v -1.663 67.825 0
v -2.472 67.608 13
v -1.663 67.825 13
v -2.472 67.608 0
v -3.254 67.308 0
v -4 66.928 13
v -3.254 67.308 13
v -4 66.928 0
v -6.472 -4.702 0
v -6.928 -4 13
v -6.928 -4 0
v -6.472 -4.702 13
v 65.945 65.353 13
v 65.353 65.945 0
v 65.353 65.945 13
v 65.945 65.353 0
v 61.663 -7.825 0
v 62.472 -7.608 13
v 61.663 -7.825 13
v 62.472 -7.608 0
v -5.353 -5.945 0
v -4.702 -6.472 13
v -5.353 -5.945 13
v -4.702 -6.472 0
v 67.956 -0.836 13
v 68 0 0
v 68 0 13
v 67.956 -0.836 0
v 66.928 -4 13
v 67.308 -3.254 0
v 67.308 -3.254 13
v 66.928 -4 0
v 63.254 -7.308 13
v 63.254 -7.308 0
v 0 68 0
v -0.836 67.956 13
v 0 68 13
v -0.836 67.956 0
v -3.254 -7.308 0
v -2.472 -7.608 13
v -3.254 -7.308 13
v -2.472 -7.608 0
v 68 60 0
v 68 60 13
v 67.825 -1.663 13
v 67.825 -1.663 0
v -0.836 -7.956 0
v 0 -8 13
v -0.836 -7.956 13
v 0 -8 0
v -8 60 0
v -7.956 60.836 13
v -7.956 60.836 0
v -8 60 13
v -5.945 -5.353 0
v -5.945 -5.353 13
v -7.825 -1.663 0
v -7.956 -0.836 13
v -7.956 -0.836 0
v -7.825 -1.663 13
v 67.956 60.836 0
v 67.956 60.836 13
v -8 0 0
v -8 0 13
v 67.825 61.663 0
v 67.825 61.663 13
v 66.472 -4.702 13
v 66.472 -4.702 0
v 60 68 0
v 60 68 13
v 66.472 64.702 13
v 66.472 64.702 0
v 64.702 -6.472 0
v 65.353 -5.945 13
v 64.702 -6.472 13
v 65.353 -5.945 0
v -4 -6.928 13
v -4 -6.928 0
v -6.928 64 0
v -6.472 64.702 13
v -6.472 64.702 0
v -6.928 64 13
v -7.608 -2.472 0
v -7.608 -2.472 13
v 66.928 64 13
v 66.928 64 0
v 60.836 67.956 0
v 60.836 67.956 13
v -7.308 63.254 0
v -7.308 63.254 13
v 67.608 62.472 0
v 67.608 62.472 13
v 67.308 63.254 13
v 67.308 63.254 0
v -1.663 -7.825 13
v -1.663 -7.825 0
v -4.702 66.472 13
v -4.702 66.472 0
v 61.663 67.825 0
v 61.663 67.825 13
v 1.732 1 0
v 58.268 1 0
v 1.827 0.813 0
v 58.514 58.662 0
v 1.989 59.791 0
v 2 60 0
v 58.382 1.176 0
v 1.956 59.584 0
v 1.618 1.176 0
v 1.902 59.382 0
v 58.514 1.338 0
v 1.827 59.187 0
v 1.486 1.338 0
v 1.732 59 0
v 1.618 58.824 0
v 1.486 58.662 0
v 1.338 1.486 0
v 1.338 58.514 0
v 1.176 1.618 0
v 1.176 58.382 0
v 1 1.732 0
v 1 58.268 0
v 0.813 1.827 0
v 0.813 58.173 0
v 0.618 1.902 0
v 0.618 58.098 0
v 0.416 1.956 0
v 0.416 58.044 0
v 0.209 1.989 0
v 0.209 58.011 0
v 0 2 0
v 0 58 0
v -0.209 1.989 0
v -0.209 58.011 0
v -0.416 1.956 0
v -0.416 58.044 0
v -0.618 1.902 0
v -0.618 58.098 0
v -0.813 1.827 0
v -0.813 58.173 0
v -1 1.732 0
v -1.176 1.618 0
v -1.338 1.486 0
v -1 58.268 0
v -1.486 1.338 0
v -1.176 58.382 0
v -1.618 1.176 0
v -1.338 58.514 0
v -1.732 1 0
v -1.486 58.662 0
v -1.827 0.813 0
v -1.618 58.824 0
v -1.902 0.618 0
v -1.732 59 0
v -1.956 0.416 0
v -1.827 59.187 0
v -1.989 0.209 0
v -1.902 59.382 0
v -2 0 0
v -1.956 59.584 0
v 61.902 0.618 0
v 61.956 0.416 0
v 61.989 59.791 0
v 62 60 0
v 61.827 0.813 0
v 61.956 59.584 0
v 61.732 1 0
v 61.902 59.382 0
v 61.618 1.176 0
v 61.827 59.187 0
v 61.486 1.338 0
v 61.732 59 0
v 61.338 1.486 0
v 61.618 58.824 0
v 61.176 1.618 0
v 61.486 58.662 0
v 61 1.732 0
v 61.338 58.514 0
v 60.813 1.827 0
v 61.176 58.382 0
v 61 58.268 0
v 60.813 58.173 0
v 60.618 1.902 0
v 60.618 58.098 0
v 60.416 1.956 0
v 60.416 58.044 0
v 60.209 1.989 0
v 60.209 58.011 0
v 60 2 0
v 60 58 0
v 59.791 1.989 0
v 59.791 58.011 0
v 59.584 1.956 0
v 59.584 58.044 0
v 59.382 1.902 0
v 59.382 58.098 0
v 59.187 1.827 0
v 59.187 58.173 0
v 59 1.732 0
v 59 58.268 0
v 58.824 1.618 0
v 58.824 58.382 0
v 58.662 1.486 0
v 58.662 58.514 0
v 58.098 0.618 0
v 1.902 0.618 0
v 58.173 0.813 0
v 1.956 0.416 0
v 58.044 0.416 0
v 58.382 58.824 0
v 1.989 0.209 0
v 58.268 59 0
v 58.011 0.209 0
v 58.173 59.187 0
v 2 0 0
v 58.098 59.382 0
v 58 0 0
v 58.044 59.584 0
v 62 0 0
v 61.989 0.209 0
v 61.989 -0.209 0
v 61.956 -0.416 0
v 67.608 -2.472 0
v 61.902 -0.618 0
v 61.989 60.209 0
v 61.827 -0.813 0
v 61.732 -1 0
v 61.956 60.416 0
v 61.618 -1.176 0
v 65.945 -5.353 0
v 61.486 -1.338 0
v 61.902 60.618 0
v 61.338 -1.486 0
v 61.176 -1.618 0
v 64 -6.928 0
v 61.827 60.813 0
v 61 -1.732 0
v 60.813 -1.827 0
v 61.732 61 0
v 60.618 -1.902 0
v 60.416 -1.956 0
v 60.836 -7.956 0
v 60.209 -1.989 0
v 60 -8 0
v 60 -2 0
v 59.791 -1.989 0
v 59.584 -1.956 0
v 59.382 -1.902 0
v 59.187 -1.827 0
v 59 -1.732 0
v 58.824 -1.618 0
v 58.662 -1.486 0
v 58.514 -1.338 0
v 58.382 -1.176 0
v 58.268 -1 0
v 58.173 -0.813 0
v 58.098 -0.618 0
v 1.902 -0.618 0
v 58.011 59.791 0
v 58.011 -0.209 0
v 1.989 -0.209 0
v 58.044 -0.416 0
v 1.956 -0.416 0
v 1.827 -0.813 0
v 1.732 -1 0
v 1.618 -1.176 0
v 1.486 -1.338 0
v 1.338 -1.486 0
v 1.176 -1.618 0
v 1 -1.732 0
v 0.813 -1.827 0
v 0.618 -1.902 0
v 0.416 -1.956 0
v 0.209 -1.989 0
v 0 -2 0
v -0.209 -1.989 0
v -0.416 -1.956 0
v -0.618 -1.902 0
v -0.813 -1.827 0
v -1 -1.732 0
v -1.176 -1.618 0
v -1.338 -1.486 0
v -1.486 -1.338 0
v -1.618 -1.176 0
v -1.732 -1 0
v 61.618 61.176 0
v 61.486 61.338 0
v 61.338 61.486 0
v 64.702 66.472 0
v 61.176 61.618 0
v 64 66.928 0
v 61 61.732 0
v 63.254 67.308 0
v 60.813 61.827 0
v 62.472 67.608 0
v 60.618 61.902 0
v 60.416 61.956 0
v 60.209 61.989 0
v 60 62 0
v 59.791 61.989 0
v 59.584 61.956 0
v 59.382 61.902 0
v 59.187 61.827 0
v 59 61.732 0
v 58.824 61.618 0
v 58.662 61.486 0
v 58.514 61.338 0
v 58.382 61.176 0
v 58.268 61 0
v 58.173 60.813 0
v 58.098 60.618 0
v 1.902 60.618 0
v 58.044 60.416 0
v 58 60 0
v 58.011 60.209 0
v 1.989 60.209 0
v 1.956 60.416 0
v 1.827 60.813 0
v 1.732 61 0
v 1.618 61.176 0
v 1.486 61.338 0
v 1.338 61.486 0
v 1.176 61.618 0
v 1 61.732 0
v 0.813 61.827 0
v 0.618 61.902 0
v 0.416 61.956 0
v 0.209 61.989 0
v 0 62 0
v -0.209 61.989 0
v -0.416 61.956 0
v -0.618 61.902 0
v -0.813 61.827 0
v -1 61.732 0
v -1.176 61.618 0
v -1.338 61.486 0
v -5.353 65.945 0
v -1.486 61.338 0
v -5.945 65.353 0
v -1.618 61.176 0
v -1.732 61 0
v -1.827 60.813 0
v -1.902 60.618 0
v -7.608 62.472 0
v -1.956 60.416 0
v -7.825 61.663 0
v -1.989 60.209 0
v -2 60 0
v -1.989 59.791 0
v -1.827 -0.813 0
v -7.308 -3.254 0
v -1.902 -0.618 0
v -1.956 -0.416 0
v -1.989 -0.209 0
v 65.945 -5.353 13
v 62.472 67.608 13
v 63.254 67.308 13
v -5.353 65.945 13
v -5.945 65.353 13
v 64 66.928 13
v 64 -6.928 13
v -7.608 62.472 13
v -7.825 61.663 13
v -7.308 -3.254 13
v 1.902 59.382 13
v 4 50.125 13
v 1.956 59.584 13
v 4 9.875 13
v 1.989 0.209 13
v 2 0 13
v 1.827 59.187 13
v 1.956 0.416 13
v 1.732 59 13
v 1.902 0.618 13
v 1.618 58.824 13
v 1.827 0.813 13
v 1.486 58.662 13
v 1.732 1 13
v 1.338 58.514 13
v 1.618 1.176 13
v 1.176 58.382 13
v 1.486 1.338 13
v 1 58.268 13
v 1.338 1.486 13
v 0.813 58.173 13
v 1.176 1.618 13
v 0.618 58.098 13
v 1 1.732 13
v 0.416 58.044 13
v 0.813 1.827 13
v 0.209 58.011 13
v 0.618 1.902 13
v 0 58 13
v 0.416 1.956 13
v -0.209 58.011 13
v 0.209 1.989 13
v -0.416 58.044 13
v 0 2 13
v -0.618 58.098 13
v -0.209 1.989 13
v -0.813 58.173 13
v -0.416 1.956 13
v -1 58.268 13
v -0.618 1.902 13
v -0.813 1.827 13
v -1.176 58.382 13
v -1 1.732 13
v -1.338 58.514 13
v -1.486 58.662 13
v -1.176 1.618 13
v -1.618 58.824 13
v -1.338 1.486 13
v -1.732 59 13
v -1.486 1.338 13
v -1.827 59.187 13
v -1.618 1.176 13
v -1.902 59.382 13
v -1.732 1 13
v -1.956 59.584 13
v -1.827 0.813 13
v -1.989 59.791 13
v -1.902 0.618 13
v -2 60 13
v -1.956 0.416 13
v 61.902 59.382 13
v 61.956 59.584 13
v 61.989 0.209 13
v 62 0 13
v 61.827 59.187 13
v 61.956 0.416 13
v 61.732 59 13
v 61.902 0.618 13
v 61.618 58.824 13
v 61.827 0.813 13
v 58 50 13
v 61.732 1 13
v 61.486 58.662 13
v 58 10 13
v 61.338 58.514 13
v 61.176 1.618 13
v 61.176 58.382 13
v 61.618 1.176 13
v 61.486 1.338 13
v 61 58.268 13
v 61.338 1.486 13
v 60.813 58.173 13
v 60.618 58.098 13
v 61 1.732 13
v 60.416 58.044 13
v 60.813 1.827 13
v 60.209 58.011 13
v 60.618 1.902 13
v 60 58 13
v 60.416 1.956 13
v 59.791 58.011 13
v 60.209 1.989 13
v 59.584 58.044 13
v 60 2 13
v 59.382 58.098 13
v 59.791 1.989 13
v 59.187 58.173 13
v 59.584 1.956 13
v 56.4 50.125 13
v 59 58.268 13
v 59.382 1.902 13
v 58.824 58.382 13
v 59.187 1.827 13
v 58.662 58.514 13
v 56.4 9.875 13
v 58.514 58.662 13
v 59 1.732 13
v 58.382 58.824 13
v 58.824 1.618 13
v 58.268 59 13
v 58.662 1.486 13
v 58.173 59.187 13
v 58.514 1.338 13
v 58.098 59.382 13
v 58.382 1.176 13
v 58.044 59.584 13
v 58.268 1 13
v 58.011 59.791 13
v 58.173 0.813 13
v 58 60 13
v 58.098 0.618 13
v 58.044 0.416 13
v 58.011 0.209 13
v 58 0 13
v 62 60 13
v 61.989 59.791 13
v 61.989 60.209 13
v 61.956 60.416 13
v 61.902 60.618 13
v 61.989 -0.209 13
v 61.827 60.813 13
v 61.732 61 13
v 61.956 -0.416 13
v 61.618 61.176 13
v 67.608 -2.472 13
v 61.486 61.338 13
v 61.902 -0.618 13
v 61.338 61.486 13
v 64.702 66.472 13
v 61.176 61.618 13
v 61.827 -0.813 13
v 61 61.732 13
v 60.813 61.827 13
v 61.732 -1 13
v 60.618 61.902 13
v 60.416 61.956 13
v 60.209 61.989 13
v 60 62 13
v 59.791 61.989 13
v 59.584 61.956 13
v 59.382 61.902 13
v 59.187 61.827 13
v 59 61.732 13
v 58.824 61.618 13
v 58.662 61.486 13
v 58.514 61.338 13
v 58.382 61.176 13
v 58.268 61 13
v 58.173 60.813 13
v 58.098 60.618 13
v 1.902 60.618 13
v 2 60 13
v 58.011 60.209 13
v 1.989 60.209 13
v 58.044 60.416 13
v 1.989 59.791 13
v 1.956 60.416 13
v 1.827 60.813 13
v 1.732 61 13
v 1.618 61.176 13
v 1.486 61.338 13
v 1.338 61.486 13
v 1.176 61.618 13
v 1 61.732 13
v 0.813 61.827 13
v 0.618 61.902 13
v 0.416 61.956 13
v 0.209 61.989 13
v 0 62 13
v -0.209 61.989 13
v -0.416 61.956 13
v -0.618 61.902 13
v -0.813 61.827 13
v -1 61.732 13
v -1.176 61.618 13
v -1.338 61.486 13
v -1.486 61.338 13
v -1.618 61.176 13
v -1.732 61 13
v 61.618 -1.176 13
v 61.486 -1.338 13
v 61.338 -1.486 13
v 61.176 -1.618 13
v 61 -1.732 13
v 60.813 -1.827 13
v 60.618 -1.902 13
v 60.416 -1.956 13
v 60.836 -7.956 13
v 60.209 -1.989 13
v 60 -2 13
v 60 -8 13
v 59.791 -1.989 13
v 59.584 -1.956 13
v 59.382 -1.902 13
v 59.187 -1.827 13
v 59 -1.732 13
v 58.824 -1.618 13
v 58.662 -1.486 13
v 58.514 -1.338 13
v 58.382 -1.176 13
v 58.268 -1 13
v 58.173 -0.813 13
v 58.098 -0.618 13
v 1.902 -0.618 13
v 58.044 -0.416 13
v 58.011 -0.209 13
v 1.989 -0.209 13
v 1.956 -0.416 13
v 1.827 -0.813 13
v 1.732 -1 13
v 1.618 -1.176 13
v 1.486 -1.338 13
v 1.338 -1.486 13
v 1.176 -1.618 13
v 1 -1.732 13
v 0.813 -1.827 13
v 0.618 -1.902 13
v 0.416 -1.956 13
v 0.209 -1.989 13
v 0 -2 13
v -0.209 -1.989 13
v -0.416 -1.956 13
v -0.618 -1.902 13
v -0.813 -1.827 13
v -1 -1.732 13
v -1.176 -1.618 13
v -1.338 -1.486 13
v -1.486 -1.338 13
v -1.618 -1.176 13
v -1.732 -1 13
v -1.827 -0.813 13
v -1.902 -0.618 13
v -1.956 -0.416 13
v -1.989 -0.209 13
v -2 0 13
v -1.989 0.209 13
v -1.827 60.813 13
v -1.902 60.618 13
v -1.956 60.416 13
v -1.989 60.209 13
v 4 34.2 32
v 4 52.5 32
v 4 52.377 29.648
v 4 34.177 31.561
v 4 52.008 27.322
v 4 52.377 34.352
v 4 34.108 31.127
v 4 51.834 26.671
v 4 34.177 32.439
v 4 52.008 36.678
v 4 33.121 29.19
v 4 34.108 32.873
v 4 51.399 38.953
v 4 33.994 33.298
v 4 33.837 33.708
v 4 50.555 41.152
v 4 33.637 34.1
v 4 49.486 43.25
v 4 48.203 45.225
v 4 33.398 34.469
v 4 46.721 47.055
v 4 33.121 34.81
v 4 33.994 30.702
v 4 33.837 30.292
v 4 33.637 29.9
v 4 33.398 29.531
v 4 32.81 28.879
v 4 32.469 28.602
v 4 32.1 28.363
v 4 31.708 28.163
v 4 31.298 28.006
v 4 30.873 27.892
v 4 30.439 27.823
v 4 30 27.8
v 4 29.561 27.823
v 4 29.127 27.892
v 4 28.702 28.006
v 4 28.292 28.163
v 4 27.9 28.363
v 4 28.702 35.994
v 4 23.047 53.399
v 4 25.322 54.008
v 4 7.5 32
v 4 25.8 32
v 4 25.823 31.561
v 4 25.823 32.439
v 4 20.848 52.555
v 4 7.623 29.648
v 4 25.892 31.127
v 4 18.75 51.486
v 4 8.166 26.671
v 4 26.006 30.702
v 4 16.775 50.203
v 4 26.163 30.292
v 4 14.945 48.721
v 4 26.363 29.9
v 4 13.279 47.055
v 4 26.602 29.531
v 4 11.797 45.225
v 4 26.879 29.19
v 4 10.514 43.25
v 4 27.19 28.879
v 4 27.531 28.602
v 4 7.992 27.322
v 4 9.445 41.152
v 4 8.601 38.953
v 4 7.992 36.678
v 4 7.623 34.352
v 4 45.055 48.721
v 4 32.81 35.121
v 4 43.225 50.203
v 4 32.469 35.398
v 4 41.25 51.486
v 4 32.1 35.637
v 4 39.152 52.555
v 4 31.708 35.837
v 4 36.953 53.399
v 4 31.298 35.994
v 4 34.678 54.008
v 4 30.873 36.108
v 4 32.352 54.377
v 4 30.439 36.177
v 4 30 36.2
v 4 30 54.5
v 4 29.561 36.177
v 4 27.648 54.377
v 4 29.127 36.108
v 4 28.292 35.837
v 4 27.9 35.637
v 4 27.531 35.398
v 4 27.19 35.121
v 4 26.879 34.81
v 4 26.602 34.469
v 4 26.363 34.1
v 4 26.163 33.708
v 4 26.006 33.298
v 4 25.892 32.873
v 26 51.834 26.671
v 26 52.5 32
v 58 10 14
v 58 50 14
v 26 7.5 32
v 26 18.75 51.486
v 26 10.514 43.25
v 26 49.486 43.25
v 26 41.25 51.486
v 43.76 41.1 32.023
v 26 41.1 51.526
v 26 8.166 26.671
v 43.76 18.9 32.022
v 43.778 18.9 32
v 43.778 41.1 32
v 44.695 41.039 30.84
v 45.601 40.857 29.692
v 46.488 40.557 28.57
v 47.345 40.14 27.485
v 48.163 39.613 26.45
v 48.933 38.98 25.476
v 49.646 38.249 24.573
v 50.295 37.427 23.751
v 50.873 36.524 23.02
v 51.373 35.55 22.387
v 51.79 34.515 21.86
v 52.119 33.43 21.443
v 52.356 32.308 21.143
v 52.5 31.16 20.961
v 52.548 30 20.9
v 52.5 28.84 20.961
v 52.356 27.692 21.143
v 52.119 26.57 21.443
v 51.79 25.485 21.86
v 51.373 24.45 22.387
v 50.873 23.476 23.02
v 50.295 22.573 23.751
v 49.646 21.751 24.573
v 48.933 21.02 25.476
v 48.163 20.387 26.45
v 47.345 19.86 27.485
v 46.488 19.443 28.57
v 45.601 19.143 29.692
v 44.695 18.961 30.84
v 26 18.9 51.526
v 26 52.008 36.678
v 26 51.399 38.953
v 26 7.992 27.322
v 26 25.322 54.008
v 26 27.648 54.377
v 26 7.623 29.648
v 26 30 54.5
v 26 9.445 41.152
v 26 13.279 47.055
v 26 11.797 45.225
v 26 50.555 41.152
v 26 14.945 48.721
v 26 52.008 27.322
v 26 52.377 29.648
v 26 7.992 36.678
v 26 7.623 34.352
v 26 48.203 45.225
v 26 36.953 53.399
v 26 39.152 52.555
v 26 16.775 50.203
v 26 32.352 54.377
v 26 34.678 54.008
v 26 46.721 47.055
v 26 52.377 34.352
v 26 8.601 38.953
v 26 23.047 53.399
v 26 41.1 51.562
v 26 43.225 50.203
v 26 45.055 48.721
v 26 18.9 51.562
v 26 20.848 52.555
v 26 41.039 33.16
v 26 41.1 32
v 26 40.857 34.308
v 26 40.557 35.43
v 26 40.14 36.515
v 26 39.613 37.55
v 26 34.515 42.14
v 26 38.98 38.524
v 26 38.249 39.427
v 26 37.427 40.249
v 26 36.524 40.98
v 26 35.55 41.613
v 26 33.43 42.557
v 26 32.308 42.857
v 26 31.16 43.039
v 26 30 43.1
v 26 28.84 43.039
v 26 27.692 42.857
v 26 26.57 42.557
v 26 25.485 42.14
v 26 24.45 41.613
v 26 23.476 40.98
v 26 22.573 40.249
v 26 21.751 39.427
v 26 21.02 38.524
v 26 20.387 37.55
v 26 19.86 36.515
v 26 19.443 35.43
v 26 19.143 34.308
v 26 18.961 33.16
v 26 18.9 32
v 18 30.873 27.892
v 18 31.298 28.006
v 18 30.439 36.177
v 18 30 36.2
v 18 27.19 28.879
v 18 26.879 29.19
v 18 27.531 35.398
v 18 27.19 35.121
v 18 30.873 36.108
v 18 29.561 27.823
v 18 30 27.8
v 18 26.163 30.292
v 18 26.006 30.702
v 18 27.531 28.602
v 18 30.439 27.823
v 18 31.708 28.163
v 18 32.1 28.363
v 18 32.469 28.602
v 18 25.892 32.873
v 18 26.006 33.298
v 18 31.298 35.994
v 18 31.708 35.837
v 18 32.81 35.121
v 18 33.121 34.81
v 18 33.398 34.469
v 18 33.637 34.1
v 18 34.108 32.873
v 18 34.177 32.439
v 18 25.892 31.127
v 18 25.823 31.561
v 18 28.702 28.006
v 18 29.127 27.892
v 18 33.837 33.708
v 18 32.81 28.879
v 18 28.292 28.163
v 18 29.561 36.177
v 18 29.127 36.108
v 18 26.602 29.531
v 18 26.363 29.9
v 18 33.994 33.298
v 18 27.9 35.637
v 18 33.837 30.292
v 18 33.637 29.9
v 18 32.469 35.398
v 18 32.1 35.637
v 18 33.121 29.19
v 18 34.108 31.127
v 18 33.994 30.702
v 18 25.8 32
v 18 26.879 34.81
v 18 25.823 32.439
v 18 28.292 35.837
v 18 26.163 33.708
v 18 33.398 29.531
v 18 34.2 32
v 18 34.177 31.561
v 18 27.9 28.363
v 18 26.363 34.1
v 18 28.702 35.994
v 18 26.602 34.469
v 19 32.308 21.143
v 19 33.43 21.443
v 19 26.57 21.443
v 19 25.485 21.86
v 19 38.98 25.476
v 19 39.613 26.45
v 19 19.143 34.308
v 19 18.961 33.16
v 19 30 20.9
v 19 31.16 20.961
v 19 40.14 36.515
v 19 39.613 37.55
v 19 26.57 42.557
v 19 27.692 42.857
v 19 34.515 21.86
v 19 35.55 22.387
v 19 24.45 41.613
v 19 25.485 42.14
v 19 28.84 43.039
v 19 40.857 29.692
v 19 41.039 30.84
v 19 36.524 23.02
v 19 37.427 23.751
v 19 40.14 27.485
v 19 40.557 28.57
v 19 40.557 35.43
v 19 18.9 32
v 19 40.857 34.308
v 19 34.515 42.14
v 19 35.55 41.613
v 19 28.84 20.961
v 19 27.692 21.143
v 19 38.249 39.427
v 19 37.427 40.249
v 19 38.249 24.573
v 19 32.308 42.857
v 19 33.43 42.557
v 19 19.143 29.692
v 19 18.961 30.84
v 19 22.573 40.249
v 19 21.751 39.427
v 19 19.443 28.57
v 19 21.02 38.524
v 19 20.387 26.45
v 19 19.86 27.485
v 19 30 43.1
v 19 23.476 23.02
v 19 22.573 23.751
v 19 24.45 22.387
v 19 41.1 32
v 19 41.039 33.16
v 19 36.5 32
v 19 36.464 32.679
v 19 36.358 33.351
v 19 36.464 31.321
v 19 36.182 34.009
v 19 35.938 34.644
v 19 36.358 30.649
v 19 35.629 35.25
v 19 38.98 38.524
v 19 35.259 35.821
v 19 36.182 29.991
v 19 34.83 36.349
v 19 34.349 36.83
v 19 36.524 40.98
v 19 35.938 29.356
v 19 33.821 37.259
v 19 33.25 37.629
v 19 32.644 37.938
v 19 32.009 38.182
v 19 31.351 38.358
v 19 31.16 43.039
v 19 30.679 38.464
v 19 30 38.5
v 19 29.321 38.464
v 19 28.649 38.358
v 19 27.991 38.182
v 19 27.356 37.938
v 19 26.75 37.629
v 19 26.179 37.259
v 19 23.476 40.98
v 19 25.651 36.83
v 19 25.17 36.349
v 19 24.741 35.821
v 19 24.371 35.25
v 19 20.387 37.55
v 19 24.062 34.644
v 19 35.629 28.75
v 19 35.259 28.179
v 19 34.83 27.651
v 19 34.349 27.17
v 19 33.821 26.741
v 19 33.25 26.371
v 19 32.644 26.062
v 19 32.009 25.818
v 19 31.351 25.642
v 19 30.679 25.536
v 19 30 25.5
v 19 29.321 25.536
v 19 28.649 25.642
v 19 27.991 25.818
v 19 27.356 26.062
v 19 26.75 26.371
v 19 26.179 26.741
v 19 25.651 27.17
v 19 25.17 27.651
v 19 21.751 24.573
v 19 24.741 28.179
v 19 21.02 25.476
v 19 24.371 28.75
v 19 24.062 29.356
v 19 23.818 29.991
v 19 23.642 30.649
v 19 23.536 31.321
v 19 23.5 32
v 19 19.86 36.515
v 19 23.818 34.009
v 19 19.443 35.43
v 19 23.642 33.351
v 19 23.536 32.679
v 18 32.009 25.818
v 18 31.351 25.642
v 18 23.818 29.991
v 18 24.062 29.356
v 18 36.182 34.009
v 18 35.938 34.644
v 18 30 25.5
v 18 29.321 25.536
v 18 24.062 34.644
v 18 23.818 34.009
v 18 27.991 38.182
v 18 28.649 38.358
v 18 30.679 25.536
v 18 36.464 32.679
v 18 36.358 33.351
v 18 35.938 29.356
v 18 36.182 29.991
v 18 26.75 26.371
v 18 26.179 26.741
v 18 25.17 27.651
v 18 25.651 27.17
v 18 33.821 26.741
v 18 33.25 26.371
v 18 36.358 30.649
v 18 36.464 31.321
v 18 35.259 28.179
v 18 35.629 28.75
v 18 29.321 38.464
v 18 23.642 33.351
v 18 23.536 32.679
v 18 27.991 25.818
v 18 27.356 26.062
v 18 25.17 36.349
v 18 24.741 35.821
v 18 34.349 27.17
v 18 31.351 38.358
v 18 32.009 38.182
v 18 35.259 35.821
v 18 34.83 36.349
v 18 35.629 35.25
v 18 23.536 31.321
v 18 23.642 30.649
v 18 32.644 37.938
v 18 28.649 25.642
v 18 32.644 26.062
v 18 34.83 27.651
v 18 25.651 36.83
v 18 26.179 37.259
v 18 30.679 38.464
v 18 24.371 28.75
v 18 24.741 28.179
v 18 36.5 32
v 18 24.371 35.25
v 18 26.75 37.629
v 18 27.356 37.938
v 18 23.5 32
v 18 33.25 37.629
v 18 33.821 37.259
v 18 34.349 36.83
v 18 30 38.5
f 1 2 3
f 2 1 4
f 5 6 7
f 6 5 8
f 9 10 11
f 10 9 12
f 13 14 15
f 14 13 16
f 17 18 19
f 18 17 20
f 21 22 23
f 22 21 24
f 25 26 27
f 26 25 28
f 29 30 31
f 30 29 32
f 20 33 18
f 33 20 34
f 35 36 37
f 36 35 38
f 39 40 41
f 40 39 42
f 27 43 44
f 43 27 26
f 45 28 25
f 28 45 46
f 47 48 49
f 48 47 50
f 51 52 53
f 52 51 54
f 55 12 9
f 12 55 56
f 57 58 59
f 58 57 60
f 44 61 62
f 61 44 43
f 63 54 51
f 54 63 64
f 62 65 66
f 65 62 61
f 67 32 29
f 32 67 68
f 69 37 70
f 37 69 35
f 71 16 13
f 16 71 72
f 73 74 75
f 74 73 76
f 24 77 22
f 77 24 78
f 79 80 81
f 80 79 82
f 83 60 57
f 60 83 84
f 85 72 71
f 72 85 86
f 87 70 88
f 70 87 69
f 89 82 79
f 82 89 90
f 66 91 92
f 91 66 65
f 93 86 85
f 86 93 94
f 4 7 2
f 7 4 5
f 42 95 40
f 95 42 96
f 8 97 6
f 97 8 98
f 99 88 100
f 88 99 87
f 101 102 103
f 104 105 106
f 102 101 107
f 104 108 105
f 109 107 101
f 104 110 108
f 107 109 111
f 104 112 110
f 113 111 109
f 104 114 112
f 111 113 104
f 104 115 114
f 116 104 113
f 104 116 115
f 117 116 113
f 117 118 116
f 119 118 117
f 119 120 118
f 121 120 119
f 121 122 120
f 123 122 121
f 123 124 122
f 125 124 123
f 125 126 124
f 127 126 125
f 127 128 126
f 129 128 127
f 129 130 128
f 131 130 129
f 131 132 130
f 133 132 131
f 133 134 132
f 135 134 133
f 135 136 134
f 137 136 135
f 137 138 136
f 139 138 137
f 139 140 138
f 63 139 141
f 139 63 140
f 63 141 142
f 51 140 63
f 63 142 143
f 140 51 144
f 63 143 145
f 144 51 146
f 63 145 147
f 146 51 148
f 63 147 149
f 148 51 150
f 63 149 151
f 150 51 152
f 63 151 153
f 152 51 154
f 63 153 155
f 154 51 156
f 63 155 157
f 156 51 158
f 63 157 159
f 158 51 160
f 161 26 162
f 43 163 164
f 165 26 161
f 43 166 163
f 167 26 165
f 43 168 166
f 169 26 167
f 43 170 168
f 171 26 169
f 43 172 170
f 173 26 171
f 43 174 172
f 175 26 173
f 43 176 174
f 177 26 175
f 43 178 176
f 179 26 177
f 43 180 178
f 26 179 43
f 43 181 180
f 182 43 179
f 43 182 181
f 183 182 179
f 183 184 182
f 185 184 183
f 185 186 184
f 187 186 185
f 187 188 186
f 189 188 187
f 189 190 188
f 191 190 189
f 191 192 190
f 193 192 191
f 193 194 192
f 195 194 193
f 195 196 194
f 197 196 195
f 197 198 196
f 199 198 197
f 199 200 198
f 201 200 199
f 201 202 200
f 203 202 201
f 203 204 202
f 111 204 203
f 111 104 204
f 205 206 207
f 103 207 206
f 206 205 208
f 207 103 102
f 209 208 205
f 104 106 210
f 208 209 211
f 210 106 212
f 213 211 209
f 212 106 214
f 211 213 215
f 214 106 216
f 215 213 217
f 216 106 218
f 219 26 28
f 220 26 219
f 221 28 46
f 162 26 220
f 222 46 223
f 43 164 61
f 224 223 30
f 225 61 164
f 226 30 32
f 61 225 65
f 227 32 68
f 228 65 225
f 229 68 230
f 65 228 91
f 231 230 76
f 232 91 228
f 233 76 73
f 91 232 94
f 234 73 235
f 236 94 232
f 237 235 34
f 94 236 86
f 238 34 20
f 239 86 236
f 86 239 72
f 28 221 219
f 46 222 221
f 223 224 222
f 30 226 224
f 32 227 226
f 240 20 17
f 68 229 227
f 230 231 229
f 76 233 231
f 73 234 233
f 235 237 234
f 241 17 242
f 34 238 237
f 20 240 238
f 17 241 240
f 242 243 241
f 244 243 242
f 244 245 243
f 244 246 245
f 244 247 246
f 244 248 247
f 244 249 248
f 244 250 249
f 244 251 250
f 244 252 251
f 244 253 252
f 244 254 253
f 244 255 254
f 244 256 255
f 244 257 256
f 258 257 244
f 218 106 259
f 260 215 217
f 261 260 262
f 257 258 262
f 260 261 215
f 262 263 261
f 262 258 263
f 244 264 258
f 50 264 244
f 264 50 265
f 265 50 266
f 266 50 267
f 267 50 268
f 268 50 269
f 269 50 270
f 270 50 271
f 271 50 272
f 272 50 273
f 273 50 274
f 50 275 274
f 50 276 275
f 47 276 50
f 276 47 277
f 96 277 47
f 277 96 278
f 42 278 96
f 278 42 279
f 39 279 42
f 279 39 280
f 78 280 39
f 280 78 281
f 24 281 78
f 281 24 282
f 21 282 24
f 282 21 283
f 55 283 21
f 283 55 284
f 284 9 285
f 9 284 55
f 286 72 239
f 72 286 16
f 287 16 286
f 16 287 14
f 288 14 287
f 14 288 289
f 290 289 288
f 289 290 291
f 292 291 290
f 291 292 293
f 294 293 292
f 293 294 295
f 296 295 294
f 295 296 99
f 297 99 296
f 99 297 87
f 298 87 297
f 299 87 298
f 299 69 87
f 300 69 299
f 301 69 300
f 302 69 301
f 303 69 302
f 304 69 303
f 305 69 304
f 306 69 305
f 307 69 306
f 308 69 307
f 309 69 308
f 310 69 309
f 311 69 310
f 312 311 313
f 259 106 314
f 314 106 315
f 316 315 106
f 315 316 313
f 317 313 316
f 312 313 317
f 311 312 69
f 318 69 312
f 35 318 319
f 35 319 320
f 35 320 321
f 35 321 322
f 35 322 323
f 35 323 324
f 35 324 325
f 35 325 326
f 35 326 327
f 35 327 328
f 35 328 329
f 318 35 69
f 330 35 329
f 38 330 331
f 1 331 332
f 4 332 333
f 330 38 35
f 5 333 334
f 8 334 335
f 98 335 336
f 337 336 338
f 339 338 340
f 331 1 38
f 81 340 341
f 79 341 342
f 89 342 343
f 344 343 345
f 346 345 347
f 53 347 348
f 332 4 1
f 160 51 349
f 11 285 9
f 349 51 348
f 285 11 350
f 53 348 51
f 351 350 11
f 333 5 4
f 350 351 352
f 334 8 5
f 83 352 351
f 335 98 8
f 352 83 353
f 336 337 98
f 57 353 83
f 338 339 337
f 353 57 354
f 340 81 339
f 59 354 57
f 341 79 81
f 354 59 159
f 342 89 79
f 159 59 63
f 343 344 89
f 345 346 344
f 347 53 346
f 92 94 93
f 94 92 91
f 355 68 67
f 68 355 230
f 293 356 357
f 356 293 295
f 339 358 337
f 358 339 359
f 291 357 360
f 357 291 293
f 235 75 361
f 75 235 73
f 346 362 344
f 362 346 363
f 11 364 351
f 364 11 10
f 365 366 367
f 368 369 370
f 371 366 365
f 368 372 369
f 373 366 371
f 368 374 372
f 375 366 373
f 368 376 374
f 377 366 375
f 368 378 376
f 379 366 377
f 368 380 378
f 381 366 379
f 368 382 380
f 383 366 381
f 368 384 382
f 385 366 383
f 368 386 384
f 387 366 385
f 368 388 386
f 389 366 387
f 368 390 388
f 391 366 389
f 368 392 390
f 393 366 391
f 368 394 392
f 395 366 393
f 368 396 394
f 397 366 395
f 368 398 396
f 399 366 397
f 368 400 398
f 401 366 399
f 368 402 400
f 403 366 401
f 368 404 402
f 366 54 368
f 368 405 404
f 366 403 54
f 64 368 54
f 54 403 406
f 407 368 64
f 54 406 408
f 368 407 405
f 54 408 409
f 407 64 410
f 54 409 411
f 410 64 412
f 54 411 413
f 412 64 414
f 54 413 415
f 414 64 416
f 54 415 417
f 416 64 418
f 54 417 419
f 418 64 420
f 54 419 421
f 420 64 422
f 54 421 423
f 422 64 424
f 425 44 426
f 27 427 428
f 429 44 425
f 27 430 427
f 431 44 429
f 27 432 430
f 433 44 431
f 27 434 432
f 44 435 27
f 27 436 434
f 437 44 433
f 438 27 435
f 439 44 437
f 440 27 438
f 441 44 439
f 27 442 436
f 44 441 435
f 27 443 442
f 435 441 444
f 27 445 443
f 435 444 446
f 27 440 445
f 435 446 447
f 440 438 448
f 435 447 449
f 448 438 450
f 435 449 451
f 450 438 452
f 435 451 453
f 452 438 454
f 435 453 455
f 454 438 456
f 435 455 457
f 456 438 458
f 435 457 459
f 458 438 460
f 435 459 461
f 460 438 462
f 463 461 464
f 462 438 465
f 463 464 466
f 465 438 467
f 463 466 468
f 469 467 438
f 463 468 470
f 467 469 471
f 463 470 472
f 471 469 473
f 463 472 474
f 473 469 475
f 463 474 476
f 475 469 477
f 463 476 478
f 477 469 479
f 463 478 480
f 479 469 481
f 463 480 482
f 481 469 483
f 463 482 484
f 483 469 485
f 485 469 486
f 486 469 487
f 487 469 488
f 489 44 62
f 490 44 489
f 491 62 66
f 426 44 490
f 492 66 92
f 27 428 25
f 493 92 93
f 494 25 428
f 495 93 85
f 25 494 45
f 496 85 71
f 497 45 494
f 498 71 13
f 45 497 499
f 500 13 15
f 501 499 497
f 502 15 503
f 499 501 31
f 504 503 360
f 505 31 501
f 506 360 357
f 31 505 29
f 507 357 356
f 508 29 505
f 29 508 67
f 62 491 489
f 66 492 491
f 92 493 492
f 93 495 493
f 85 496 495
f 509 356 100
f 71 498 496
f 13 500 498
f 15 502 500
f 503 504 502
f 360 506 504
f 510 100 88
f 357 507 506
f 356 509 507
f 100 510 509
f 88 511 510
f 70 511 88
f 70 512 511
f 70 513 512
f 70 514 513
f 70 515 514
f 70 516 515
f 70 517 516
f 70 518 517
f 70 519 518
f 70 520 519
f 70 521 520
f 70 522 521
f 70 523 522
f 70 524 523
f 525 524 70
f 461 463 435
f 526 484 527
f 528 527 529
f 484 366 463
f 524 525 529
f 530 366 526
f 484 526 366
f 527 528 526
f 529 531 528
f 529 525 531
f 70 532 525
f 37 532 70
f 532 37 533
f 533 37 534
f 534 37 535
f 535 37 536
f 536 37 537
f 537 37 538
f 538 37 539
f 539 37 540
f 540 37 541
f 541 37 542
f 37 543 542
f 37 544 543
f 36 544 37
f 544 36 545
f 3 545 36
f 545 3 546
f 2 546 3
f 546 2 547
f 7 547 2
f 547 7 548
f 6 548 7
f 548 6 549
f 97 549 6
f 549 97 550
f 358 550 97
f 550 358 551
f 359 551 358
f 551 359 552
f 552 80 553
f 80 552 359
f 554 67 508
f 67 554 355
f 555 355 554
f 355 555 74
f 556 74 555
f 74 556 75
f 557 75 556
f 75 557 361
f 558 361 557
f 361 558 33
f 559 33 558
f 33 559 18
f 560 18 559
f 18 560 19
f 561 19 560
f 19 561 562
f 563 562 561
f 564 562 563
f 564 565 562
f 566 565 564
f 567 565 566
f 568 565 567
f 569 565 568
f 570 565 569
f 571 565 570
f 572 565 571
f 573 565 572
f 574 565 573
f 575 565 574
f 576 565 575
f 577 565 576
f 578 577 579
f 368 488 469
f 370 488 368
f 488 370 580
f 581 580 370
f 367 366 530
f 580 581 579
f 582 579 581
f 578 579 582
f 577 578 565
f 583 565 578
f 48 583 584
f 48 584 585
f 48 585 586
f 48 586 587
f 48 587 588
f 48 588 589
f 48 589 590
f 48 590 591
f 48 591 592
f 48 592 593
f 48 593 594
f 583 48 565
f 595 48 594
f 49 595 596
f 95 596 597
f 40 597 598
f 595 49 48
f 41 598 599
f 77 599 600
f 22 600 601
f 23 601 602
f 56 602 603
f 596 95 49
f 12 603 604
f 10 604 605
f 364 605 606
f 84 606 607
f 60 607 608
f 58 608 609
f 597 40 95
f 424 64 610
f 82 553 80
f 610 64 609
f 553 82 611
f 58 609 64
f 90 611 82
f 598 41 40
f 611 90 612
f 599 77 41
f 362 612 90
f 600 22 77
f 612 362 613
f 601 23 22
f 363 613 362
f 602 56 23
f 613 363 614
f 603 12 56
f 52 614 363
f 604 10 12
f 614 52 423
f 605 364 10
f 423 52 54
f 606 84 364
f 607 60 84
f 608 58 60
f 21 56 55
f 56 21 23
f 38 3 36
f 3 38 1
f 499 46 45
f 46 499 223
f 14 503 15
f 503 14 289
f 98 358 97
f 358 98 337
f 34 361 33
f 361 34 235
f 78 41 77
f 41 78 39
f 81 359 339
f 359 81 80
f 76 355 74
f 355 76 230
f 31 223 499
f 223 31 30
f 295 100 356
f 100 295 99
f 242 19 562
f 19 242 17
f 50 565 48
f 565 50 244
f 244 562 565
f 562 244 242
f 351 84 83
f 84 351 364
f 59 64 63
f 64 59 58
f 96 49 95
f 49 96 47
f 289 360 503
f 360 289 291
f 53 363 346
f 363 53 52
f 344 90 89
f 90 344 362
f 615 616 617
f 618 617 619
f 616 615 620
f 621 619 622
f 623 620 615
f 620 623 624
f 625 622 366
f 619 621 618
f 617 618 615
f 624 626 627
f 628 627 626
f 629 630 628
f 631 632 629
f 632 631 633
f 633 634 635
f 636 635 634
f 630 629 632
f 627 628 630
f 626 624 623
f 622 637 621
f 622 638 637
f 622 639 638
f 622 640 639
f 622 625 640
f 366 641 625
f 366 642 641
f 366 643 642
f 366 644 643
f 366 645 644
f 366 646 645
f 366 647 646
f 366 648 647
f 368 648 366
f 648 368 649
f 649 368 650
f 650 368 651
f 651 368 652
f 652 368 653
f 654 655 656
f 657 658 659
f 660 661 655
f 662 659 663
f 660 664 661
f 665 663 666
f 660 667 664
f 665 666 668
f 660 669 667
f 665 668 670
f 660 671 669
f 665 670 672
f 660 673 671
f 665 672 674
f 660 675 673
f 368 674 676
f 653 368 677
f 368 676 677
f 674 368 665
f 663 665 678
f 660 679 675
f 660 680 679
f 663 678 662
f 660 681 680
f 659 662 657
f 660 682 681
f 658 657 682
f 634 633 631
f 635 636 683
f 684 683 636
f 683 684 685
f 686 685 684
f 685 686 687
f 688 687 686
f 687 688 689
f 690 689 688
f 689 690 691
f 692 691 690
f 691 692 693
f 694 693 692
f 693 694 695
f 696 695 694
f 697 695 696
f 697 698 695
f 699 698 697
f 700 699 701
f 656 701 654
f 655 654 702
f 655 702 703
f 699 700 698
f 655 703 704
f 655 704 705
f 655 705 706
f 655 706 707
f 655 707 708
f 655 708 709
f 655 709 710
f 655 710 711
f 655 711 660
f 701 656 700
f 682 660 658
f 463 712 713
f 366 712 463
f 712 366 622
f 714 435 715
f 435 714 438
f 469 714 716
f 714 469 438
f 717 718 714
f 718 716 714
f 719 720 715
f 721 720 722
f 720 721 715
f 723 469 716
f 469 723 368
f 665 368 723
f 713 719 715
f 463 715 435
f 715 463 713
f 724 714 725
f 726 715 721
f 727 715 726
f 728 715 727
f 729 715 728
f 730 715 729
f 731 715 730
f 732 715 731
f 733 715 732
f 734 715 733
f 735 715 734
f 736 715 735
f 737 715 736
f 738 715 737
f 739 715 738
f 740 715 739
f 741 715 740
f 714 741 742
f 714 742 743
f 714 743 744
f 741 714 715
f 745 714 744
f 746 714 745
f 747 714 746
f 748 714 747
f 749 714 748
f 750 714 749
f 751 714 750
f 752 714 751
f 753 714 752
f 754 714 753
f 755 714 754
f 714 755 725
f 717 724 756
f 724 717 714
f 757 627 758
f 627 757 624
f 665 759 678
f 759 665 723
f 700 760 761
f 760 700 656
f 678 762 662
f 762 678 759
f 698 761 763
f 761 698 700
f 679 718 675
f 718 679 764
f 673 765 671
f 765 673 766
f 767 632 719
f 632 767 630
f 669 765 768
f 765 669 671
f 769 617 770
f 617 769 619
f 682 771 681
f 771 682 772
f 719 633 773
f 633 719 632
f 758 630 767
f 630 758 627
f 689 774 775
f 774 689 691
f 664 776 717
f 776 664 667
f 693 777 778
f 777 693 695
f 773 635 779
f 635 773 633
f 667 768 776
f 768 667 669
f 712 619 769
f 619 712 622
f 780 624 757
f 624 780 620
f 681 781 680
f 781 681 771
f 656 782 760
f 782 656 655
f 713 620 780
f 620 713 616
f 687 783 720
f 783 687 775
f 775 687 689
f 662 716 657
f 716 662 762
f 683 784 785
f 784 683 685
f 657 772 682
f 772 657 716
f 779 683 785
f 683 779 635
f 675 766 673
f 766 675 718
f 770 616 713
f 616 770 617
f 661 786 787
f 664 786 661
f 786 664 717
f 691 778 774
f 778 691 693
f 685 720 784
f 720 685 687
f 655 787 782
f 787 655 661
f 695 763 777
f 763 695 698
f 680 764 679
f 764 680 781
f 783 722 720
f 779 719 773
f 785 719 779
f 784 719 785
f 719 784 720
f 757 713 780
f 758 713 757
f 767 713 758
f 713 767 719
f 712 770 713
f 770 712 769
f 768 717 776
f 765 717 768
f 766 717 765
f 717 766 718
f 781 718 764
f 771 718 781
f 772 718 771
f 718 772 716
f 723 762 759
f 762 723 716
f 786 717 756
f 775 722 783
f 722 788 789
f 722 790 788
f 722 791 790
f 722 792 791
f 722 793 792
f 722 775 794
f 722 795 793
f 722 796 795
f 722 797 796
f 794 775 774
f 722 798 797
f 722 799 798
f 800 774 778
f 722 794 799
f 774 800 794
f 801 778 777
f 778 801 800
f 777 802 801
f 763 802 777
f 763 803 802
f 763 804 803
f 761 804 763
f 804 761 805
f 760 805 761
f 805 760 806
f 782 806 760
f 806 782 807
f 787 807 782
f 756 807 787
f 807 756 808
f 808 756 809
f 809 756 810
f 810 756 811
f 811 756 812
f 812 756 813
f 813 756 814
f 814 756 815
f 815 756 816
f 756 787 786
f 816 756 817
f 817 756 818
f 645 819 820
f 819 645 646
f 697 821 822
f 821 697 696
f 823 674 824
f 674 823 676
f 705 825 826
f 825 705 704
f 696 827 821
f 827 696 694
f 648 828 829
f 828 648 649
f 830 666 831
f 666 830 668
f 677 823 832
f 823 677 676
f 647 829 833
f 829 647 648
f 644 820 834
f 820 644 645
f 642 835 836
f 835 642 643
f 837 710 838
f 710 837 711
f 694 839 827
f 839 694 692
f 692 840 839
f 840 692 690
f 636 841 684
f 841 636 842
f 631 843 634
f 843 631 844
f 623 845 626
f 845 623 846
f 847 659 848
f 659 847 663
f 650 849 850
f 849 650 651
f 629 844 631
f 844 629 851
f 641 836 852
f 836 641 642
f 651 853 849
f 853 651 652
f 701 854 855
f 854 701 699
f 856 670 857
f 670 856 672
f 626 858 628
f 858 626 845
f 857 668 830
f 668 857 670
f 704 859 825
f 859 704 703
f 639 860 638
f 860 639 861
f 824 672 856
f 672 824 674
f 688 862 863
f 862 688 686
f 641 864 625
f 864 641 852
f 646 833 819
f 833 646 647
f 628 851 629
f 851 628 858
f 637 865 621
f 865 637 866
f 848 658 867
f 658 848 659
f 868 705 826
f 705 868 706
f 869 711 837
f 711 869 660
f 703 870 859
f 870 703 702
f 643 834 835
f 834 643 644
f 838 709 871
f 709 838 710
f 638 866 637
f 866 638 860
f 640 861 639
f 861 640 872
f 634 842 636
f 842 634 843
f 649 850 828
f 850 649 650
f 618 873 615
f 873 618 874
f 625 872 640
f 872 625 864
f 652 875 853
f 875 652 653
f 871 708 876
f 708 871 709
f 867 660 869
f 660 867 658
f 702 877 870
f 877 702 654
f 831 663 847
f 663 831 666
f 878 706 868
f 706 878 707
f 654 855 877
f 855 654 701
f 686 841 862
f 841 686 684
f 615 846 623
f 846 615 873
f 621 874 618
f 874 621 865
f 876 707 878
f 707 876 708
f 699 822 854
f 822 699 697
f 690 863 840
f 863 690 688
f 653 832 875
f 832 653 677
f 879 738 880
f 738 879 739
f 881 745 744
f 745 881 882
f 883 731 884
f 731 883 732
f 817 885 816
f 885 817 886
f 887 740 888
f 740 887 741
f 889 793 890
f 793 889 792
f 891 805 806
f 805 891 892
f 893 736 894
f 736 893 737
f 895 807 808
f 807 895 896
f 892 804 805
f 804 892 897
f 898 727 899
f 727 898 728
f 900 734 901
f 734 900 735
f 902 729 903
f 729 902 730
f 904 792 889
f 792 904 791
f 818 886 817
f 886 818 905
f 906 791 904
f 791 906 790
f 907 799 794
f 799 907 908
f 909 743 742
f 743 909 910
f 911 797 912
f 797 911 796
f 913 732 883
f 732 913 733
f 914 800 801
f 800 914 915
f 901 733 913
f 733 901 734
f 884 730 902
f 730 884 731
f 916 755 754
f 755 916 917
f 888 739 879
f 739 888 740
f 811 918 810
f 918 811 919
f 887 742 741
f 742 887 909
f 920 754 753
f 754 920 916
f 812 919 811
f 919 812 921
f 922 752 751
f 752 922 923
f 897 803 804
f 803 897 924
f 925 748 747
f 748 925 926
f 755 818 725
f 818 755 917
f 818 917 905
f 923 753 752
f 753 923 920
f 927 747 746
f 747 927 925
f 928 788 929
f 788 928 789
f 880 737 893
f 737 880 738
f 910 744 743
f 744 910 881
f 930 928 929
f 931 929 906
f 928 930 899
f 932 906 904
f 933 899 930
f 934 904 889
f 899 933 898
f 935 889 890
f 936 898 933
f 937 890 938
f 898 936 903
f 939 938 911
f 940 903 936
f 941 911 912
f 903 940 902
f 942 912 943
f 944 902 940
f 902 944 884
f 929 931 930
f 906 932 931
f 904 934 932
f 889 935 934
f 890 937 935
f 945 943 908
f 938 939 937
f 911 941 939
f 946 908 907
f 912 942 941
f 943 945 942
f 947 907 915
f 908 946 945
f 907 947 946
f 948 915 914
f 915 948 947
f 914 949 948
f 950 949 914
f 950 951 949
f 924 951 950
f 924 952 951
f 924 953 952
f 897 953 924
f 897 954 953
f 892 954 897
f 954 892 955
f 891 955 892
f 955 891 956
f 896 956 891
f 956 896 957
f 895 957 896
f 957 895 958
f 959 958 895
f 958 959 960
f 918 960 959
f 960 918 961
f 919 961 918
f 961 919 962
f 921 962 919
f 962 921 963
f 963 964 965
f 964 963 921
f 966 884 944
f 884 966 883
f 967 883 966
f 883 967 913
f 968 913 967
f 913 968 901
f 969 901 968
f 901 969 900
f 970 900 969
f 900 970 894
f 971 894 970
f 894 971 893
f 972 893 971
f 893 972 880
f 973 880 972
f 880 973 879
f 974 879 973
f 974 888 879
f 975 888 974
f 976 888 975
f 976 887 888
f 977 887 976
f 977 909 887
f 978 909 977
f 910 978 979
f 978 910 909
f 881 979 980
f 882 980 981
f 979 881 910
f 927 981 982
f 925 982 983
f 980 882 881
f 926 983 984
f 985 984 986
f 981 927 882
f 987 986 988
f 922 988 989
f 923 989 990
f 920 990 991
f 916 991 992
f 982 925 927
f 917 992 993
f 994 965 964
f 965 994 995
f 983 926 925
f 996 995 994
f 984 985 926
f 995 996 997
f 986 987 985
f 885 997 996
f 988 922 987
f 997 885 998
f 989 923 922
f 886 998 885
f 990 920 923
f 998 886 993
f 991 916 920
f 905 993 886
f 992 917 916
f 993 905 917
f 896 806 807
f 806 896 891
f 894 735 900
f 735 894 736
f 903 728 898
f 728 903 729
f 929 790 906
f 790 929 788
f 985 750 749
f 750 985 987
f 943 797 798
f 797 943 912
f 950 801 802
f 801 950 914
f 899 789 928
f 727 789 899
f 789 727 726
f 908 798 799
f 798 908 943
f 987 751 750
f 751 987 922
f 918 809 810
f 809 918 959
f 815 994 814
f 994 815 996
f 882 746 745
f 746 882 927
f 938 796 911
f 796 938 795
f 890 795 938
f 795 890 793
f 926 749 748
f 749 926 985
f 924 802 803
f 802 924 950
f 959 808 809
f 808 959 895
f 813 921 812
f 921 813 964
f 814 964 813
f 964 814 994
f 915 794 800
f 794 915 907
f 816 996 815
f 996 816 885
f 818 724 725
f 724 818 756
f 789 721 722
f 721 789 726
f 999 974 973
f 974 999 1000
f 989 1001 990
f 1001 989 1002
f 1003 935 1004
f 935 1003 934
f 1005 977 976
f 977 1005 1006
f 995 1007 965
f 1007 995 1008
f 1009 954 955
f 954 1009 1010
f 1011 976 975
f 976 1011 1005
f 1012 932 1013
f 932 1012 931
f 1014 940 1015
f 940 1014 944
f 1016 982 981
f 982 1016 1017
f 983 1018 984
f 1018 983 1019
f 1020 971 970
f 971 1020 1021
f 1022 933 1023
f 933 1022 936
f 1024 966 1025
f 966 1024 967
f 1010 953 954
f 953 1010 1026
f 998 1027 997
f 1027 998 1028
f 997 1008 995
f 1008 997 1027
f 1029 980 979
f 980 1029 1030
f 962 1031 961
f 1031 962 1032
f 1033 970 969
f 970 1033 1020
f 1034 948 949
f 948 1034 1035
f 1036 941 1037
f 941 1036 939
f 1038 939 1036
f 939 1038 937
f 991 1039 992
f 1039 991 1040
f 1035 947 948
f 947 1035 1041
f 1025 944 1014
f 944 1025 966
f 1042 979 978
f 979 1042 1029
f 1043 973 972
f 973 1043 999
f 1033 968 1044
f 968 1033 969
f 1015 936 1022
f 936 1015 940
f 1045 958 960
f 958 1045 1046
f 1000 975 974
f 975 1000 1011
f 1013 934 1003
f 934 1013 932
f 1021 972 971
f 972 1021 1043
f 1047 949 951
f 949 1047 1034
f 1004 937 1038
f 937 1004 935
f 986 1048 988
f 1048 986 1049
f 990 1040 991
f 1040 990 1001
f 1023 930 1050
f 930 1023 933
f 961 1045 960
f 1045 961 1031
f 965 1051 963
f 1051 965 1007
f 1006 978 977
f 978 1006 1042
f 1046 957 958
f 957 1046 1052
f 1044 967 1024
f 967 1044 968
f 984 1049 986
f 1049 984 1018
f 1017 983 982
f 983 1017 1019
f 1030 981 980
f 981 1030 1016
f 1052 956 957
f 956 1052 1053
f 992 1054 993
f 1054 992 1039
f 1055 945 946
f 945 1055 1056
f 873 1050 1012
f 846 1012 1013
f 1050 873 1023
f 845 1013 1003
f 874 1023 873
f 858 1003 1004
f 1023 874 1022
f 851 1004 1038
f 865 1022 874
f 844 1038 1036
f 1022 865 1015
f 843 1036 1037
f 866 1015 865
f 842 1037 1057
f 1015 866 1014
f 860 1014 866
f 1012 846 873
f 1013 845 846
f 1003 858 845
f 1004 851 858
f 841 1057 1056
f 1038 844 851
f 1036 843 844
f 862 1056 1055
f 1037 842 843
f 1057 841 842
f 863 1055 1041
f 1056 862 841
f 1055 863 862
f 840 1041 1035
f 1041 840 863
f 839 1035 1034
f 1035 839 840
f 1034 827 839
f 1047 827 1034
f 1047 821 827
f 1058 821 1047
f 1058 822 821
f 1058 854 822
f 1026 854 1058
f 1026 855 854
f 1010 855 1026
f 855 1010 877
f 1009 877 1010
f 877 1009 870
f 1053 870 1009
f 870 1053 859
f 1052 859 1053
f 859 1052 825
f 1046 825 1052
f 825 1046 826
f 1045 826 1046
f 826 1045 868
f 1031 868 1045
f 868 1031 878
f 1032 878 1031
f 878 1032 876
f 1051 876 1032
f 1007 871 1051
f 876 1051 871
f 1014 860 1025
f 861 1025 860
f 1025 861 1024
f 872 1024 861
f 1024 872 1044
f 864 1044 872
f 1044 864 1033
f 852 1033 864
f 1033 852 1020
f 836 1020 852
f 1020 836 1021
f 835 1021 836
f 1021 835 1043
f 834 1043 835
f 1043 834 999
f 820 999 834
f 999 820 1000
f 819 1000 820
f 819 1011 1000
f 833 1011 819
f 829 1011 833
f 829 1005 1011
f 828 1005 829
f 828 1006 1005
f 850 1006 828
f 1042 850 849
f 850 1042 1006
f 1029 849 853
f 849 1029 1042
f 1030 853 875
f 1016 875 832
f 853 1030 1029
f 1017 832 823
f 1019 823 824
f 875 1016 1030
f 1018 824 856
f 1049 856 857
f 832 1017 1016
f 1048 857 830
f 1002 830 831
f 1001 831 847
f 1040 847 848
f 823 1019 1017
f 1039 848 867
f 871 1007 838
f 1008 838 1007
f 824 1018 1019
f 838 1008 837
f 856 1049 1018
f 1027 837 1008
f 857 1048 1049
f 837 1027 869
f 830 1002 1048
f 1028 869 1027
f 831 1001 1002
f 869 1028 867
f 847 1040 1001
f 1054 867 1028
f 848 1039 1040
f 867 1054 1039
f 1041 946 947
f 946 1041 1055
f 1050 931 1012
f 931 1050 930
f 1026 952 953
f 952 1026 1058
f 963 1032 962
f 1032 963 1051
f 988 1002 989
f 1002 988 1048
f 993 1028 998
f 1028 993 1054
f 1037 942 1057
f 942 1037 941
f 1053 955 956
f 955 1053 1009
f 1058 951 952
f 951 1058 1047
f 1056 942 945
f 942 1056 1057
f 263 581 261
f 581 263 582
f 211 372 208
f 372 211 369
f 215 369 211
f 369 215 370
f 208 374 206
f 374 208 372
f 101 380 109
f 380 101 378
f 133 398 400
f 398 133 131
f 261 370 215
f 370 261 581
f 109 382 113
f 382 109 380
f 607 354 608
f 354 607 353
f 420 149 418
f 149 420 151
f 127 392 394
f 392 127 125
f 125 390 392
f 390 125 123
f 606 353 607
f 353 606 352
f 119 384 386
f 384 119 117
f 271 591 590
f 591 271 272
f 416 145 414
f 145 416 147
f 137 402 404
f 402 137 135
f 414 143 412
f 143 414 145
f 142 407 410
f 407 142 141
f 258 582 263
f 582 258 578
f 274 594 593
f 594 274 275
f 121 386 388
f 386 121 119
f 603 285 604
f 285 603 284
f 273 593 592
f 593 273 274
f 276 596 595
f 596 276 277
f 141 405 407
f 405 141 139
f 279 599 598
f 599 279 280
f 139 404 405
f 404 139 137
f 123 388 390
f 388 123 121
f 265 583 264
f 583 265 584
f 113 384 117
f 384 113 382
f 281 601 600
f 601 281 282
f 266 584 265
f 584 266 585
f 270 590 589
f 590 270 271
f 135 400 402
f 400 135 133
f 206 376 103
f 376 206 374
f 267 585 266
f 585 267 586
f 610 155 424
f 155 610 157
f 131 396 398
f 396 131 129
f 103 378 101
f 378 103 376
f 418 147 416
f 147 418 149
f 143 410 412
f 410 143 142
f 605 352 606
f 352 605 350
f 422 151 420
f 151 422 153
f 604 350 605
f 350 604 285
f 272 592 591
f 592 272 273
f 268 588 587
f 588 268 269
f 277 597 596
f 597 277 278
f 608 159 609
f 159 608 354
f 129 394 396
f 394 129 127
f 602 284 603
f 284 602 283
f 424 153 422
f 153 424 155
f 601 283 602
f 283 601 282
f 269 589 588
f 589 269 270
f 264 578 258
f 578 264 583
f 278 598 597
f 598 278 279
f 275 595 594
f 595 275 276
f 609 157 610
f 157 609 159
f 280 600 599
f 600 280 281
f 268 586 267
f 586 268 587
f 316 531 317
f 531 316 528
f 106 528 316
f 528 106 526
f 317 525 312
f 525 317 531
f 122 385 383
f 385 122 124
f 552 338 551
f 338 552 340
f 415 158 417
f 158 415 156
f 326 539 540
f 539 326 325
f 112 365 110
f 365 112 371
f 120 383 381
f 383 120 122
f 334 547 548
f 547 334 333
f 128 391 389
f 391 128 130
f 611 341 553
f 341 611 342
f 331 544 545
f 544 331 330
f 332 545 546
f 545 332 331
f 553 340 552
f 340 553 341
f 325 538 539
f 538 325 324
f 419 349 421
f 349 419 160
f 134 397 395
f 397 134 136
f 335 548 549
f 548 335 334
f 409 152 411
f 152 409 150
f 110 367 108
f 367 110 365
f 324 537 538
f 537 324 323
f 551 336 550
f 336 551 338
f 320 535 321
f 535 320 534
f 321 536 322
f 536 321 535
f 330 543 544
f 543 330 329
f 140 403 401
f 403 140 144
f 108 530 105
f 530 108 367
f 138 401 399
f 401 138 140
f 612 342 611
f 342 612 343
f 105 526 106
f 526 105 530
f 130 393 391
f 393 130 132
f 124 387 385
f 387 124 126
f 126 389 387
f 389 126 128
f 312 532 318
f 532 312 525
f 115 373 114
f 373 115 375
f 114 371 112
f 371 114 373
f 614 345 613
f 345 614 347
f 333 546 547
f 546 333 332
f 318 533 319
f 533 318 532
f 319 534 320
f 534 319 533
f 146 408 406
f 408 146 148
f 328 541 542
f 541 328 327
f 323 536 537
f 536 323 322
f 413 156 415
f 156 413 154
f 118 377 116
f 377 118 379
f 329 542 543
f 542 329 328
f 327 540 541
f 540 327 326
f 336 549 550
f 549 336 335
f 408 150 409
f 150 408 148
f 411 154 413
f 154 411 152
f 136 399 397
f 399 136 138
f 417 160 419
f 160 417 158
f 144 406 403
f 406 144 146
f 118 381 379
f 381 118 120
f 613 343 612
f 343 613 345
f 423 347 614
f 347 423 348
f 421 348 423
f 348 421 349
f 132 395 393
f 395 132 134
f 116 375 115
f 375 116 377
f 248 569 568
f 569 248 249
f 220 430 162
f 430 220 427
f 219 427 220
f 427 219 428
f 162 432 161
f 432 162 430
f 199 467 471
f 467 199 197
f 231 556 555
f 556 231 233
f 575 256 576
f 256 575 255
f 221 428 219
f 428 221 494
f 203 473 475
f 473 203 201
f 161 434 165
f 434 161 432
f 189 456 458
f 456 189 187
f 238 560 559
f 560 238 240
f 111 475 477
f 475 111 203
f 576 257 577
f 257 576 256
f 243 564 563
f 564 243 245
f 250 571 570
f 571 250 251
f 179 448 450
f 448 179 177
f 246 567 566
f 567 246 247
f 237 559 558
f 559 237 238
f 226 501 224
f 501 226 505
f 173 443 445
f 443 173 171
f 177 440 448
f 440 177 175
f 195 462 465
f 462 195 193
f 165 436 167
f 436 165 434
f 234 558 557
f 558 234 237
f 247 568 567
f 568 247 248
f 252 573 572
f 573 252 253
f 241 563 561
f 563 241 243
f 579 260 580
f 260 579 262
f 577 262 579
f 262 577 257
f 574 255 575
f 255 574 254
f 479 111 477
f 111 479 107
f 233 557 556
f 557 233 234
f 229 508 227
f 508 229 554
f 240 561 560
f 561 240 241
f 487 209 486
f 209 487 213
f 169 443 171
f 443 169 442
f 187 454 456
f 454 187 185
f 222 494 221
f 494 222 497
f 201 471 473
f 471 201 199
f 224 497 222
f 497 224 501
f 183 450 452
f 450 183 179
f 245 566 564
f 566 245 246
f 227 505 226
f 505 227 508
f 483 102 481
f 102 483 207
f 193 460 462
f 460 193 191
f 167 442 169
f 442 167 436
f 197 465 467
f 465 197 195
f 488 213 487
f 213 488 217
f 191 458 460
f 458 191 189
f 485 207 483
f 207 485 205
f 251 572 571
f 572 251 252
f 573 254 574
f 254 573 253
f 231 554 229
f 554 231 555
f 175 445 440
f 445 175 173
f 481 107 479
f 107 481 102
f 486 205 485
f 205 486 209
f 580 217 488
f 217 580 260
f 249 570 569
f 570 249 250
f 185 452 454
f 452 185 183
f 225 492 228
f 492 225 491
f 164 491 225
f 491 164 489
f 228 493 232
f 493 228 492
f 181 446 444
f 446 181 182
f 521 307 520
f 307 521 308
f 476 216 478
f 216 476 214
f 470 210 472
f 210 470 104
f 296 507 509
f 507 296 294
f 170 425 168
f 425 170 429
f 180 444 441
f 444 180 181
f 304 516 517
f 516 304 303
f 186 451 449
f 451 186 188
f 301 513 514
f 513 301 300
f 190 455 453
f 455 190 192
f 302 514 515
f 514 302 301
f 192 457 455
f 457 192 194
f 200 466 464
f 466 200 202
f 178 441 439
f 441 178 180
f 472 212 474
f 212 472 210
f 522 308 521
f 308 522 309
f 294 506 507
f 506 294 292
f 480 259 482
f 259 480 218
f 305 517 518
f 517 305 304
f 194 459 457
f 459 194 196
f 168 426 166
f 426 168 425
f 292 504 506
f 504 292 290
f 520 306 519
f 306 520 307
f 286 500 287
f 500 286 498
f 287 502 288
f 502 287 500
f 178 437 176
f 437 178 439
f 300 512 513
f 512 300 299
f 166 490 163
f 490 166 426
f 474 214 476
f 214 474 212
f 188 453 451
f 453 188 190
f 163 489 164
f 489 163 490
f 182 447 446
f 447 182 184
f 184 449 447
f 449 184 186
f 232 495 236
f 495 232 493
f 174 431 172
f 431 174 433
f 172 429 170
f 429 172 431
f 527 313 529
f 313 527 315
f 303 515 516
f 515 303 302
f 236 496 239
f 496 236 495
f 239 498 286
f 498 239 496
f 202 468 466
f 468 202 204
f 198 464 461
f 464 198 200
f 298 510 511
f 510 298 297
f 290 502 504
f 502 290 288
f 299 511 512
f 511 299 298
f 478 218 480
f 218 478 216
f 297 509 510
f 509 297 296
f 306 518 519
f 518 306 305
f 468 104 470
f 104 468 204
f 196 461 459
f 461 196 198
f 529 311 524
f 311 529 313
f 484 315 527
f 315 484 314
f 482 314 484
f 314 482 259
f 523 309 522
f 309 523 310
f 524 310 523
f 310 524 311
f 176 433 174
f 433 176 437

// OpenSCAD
module plate() {
	distance=20;
	difference() {
		union() {
			// plate with nice rounded edge
			hull() {
				minkowski() {
					cube([60, 60, 12]);
					cylinder(r=8, h=1, $fn=60);
				}
			}
			// main block
			hull() {
				*translate([4,60/2-36/2,12]) cube([22, 36, 30]);
				translate([4,60/2-40/2,12]) cube([54, 40, 2]);
				translate([4,60/2,12+distance]) rotate([0,90,0]) cylinder(r=45/2,h=22, $fn=12);
			}
			translate([4,60/2,12+distance]) rotate([0,90,0]) cylinder(r=45/2,h=18, $fn=60);
			// bearing
			translate([4+12,60/2,12+distance]) rotate([0,90,0]) cylinder(r=45/2,h=10, $fn=60);
		}
		union() {
			// main screw
			translate([4-1,60/2,12+distance]) rotate([0,90,0]) cylinder(r=8.4/2,h=25, $fn=60);
			// bearing
			translate([4+12+3,60/2,12+distance]) rotate([0,90,0]) cylinder(r=22.2/2,h=40, $fn=60);
			hull() for(z=[0,20])
				translate([4+12+3+7,60/2,12+distance+z]) rotate([0,90,0]) cylinder(r=22.2/2,h=40, $fn=60);
			translate([4+12+2,60/2,12+distance]) rotate([0,90,0]) cylinder(r=13/2, h=2, $fn=60);
			// wall screws
			translate([0,0,-1]) cylinder(r=4/2, h=12+2, $fn=60);
			translate([0,60,-1]) cylinder(r=4/2, h=12+2, $fn=60);
			translate([60,0,-1]) cylinder(r=4/2, h=12+2, $fn=60);
			translate([60,60,-1]) cylinder(r=4/2, h=12+2, $fn=60);
		}
	}
}

plate();
